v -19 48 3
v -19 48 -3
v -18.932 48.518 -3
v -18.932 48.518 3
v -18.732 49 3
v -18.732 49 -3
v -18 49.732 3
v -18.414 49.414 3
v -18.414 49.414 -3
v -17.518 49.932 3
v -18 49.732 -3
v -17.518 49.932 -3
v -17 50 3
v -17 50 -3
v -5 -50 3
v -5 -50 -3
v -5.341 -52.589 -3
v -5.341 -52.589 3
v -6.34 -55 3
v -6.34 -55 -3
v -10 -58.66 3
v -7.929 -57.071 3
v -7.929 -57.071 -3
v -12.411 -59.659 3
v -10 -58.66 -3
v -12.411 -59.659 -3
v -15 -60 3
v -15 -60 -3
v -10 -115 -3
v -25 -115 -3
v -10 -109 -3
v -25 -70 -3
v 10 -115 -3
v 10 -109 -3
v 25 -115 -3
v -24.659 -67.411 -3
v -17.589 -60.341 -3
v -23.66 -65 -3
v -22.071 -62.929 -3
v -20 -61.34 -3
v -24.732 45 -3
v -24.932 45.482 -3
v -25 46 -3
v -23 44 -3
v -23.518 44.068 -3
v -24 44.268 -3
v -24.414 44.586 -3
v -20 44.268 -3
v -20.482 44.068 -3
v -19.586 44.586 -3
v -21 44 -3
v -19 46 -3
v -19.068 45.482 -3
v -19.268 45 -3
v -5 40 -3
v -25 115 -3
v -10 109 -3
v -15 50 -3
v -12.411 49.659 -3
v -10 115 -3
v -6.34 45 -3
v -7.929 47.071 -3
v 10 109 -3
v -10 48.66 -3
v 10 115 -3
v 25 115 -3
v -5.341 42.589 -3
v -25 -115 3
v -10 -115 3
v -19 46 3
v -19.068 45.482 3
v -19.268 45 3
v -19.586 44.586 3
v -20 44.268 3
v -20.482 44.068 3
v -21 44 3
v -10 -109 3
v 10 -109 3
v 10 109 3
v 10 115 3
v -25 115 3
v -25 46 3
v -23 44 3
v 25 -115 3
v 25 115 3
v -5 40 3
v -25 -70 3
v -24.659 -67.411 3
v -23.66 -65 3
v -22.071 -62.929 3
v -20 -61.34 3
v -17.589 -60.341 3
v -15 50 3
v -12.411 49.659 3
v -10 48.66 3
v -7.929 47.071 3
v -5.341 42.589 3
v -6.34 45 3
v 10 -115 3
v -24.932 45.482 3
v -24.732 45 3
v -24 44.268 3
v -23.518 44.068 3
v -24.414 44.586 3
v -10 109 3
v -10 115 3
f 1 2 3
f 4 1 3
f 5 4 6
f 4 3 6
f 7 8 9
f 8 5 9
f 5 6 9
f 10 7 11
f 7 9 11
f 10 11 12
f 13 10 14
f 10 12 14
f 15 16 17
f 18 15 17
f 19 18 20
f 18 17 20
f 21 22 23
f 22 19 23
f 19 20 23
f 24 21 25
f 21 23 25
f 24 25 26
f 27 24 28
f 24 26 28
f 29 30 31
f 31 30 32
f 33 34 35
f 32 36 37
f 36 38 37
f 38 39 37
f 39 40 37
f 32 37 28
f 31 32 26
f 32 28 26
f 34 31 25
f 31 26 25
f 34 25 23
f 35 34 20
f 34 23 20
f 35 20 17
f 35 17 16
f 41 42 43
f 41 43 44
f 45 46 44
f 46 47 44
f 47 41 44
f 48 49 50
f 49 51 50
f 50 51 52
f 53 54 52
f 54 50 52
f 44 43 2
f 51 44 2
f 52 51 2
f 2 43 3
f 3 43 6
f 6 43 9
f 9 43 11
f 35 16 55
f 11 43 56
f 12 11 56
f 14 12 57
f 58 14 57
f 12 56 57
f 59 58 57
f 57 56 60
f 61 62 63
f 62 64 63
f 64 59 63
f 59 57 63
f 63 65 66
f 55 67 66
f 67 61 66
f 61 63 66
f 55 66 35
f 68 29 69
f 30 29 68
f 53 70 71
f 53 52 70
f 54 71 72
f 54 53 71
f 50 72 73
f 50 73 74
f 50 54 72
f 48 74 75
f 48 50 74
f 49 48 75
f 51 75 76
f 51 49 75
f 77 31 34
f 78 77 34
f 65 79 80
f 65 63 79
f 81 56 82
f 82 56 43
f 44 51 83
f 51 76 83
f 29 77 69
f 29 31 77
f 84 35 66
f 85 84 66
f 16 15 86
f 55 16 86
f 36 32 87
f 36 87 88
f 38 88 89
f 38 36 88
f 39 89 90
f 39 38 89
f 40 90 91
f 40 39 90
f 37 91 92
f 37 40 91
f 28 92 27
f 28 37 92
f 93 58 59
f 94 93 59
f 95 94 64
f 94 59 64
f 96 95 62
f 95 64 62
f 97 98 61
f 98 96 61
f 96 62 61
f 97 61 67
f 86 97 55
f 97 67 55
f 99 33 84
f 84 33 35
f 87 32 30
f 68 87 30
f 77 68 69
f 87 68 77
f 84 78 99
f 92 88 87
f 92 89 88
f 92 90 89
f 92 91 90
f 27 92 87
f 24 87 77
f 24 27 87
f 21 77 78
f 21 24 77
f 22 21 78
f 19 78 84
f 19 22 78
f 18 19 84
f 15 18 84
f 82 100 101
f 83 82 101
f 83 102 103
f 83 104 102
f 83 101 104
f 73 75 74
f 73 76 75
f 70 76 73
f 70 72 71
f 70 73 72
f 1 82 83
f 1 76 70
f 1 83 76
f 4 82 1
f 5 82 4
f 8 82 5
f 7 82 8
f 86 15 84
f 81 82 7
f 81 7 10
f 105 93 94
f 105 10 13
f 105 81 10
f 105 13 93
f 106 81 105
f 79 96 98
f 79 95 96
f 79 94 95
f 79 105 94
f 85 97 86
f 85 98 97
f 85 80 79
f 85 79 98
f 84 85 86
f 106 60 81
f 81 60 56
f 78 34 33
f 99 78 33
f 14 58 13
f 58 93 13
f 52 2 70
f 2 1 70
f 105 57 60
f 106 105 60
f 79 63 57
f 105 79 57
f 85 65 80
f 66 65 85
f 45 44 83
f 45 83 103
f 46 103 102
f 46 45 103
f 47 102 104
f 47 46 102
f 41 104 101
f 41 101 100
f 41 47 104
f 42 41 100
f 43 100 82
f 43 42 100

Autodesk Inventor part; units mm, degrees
ref_plane "YZ Plane" through (0, 0, 0) normal (1, 0, 0) x (0, 1, 0)
ref_plane "XZ Plane" through (0, 0, 0) normal (0, 1, 0) x (-1, 0, 0)
ref_plane "XY Plane" through (0, 0, 0) normal (0, 0, 1) x (1, 0, 0)
sketch "Эскиз1" plane through (0, 0, 0) normal (0, 0, 1) x (1, 0, 0)
  line L0 (-25, -109) -> (25, -109)
  line L1 (25, -109) -> (25, 109)
  line L2 (25, 109) -> (-25, 109)
  line L3 (-25, 109) -> (-25, -109)
  line L4 (-25, -109) -> (25, 109) construction
  line L5 (25, -109) -> (-25, 109) construction
  line L6 (0, 0) -> (0, 129.6236) construction
  line L7 (0, 0) -> (116.4638, 0) construction
  line L8 (-25, 109) -> (-10, 109)
  line L9 (-10, 109) -> (-10, 115)
  line L10 (-10, 115) -> (-25, 115)
  line L11 (-25, 115) -> (-25, 109)
  line L12 (25, 109) -> (10, 109)
  line L13 (10, 109) -> (10, 115)
  line L14 (10, 115) -> (25, 115)
  line L15 (25, 115) -> (25, 109)
  line L16 (-25, -109) -> (-10, -109)
  line L17 (-10, -109) -> (-10, -115)
  line L18 (-10, -115) -> (-25, -115)
  line L19 (-25, -115) -> (-25, -109)
  line L20 (25, -109) -> (10, -109)
  line L21 (10, -109) -> (10, -115)
  line L22 (10, -115) -> (25, -115)
  line L23 (25, -115) -> (25, -109)
  dimension "d0" = 50
  dimension "d1" = 15
  dimension "d2" = 6
  dimension "d3" = 230
extrude "Выдавливание1" add sketch "Эскиз1" along normal mid plane 6
sketch "Эскиз2" plane through (0, 0, 3) normal (0, 0, 1) x (1, 0, 0)
  point P0 (0, 0)
sketch "Эскиз3" plane through (0, 0, 3) normal (0, 0, 1) x (1, 0, 0)
  line L0 (-41.4458, -60) -> (-5, -60)
  line L1 (-5, -60) -> (-5, 50)
  line L2 (-5, 50) -> (-41.4458, 50)
  line L3 (-41.4458, 50) -> (-41.4458, -60)
  line L4 (-25, -115) -> (-10, -115) projected
  line L5 (-25, 115) -> (-25, -115) projected
  line L6 (-25, 50) -> (-19, 50)
  line L7 (-19, 50) -> (-19, 44)
  line L8 (-19, 44) -> (-25, 44)
  line L9 (-25, 44) -> (-25, 50)
  point P0 (0, 0)
  dimension "d8" = 20
  dimension "d12" = 6
  dimension "d13" = 6
  dimension "d17" = 50
  dimension "d18" = 60
extrude "Выдавливание2" cut sketch "Эскиз3" against normal through all contours L3 L2 L5 L0 | L5 L8 L7 L2 L1 L0
fillet "Сопряжение1" radius 10 3 edges at (-5, -60, 0) (-5, 50, 0) (-25, -60, 0)
fillet "Сопряжение2" radius 2 3 edges at (-19, 44, 0) (-25, 44, 0) (-19, 50, 0)
properties part number "Планка боковая"
